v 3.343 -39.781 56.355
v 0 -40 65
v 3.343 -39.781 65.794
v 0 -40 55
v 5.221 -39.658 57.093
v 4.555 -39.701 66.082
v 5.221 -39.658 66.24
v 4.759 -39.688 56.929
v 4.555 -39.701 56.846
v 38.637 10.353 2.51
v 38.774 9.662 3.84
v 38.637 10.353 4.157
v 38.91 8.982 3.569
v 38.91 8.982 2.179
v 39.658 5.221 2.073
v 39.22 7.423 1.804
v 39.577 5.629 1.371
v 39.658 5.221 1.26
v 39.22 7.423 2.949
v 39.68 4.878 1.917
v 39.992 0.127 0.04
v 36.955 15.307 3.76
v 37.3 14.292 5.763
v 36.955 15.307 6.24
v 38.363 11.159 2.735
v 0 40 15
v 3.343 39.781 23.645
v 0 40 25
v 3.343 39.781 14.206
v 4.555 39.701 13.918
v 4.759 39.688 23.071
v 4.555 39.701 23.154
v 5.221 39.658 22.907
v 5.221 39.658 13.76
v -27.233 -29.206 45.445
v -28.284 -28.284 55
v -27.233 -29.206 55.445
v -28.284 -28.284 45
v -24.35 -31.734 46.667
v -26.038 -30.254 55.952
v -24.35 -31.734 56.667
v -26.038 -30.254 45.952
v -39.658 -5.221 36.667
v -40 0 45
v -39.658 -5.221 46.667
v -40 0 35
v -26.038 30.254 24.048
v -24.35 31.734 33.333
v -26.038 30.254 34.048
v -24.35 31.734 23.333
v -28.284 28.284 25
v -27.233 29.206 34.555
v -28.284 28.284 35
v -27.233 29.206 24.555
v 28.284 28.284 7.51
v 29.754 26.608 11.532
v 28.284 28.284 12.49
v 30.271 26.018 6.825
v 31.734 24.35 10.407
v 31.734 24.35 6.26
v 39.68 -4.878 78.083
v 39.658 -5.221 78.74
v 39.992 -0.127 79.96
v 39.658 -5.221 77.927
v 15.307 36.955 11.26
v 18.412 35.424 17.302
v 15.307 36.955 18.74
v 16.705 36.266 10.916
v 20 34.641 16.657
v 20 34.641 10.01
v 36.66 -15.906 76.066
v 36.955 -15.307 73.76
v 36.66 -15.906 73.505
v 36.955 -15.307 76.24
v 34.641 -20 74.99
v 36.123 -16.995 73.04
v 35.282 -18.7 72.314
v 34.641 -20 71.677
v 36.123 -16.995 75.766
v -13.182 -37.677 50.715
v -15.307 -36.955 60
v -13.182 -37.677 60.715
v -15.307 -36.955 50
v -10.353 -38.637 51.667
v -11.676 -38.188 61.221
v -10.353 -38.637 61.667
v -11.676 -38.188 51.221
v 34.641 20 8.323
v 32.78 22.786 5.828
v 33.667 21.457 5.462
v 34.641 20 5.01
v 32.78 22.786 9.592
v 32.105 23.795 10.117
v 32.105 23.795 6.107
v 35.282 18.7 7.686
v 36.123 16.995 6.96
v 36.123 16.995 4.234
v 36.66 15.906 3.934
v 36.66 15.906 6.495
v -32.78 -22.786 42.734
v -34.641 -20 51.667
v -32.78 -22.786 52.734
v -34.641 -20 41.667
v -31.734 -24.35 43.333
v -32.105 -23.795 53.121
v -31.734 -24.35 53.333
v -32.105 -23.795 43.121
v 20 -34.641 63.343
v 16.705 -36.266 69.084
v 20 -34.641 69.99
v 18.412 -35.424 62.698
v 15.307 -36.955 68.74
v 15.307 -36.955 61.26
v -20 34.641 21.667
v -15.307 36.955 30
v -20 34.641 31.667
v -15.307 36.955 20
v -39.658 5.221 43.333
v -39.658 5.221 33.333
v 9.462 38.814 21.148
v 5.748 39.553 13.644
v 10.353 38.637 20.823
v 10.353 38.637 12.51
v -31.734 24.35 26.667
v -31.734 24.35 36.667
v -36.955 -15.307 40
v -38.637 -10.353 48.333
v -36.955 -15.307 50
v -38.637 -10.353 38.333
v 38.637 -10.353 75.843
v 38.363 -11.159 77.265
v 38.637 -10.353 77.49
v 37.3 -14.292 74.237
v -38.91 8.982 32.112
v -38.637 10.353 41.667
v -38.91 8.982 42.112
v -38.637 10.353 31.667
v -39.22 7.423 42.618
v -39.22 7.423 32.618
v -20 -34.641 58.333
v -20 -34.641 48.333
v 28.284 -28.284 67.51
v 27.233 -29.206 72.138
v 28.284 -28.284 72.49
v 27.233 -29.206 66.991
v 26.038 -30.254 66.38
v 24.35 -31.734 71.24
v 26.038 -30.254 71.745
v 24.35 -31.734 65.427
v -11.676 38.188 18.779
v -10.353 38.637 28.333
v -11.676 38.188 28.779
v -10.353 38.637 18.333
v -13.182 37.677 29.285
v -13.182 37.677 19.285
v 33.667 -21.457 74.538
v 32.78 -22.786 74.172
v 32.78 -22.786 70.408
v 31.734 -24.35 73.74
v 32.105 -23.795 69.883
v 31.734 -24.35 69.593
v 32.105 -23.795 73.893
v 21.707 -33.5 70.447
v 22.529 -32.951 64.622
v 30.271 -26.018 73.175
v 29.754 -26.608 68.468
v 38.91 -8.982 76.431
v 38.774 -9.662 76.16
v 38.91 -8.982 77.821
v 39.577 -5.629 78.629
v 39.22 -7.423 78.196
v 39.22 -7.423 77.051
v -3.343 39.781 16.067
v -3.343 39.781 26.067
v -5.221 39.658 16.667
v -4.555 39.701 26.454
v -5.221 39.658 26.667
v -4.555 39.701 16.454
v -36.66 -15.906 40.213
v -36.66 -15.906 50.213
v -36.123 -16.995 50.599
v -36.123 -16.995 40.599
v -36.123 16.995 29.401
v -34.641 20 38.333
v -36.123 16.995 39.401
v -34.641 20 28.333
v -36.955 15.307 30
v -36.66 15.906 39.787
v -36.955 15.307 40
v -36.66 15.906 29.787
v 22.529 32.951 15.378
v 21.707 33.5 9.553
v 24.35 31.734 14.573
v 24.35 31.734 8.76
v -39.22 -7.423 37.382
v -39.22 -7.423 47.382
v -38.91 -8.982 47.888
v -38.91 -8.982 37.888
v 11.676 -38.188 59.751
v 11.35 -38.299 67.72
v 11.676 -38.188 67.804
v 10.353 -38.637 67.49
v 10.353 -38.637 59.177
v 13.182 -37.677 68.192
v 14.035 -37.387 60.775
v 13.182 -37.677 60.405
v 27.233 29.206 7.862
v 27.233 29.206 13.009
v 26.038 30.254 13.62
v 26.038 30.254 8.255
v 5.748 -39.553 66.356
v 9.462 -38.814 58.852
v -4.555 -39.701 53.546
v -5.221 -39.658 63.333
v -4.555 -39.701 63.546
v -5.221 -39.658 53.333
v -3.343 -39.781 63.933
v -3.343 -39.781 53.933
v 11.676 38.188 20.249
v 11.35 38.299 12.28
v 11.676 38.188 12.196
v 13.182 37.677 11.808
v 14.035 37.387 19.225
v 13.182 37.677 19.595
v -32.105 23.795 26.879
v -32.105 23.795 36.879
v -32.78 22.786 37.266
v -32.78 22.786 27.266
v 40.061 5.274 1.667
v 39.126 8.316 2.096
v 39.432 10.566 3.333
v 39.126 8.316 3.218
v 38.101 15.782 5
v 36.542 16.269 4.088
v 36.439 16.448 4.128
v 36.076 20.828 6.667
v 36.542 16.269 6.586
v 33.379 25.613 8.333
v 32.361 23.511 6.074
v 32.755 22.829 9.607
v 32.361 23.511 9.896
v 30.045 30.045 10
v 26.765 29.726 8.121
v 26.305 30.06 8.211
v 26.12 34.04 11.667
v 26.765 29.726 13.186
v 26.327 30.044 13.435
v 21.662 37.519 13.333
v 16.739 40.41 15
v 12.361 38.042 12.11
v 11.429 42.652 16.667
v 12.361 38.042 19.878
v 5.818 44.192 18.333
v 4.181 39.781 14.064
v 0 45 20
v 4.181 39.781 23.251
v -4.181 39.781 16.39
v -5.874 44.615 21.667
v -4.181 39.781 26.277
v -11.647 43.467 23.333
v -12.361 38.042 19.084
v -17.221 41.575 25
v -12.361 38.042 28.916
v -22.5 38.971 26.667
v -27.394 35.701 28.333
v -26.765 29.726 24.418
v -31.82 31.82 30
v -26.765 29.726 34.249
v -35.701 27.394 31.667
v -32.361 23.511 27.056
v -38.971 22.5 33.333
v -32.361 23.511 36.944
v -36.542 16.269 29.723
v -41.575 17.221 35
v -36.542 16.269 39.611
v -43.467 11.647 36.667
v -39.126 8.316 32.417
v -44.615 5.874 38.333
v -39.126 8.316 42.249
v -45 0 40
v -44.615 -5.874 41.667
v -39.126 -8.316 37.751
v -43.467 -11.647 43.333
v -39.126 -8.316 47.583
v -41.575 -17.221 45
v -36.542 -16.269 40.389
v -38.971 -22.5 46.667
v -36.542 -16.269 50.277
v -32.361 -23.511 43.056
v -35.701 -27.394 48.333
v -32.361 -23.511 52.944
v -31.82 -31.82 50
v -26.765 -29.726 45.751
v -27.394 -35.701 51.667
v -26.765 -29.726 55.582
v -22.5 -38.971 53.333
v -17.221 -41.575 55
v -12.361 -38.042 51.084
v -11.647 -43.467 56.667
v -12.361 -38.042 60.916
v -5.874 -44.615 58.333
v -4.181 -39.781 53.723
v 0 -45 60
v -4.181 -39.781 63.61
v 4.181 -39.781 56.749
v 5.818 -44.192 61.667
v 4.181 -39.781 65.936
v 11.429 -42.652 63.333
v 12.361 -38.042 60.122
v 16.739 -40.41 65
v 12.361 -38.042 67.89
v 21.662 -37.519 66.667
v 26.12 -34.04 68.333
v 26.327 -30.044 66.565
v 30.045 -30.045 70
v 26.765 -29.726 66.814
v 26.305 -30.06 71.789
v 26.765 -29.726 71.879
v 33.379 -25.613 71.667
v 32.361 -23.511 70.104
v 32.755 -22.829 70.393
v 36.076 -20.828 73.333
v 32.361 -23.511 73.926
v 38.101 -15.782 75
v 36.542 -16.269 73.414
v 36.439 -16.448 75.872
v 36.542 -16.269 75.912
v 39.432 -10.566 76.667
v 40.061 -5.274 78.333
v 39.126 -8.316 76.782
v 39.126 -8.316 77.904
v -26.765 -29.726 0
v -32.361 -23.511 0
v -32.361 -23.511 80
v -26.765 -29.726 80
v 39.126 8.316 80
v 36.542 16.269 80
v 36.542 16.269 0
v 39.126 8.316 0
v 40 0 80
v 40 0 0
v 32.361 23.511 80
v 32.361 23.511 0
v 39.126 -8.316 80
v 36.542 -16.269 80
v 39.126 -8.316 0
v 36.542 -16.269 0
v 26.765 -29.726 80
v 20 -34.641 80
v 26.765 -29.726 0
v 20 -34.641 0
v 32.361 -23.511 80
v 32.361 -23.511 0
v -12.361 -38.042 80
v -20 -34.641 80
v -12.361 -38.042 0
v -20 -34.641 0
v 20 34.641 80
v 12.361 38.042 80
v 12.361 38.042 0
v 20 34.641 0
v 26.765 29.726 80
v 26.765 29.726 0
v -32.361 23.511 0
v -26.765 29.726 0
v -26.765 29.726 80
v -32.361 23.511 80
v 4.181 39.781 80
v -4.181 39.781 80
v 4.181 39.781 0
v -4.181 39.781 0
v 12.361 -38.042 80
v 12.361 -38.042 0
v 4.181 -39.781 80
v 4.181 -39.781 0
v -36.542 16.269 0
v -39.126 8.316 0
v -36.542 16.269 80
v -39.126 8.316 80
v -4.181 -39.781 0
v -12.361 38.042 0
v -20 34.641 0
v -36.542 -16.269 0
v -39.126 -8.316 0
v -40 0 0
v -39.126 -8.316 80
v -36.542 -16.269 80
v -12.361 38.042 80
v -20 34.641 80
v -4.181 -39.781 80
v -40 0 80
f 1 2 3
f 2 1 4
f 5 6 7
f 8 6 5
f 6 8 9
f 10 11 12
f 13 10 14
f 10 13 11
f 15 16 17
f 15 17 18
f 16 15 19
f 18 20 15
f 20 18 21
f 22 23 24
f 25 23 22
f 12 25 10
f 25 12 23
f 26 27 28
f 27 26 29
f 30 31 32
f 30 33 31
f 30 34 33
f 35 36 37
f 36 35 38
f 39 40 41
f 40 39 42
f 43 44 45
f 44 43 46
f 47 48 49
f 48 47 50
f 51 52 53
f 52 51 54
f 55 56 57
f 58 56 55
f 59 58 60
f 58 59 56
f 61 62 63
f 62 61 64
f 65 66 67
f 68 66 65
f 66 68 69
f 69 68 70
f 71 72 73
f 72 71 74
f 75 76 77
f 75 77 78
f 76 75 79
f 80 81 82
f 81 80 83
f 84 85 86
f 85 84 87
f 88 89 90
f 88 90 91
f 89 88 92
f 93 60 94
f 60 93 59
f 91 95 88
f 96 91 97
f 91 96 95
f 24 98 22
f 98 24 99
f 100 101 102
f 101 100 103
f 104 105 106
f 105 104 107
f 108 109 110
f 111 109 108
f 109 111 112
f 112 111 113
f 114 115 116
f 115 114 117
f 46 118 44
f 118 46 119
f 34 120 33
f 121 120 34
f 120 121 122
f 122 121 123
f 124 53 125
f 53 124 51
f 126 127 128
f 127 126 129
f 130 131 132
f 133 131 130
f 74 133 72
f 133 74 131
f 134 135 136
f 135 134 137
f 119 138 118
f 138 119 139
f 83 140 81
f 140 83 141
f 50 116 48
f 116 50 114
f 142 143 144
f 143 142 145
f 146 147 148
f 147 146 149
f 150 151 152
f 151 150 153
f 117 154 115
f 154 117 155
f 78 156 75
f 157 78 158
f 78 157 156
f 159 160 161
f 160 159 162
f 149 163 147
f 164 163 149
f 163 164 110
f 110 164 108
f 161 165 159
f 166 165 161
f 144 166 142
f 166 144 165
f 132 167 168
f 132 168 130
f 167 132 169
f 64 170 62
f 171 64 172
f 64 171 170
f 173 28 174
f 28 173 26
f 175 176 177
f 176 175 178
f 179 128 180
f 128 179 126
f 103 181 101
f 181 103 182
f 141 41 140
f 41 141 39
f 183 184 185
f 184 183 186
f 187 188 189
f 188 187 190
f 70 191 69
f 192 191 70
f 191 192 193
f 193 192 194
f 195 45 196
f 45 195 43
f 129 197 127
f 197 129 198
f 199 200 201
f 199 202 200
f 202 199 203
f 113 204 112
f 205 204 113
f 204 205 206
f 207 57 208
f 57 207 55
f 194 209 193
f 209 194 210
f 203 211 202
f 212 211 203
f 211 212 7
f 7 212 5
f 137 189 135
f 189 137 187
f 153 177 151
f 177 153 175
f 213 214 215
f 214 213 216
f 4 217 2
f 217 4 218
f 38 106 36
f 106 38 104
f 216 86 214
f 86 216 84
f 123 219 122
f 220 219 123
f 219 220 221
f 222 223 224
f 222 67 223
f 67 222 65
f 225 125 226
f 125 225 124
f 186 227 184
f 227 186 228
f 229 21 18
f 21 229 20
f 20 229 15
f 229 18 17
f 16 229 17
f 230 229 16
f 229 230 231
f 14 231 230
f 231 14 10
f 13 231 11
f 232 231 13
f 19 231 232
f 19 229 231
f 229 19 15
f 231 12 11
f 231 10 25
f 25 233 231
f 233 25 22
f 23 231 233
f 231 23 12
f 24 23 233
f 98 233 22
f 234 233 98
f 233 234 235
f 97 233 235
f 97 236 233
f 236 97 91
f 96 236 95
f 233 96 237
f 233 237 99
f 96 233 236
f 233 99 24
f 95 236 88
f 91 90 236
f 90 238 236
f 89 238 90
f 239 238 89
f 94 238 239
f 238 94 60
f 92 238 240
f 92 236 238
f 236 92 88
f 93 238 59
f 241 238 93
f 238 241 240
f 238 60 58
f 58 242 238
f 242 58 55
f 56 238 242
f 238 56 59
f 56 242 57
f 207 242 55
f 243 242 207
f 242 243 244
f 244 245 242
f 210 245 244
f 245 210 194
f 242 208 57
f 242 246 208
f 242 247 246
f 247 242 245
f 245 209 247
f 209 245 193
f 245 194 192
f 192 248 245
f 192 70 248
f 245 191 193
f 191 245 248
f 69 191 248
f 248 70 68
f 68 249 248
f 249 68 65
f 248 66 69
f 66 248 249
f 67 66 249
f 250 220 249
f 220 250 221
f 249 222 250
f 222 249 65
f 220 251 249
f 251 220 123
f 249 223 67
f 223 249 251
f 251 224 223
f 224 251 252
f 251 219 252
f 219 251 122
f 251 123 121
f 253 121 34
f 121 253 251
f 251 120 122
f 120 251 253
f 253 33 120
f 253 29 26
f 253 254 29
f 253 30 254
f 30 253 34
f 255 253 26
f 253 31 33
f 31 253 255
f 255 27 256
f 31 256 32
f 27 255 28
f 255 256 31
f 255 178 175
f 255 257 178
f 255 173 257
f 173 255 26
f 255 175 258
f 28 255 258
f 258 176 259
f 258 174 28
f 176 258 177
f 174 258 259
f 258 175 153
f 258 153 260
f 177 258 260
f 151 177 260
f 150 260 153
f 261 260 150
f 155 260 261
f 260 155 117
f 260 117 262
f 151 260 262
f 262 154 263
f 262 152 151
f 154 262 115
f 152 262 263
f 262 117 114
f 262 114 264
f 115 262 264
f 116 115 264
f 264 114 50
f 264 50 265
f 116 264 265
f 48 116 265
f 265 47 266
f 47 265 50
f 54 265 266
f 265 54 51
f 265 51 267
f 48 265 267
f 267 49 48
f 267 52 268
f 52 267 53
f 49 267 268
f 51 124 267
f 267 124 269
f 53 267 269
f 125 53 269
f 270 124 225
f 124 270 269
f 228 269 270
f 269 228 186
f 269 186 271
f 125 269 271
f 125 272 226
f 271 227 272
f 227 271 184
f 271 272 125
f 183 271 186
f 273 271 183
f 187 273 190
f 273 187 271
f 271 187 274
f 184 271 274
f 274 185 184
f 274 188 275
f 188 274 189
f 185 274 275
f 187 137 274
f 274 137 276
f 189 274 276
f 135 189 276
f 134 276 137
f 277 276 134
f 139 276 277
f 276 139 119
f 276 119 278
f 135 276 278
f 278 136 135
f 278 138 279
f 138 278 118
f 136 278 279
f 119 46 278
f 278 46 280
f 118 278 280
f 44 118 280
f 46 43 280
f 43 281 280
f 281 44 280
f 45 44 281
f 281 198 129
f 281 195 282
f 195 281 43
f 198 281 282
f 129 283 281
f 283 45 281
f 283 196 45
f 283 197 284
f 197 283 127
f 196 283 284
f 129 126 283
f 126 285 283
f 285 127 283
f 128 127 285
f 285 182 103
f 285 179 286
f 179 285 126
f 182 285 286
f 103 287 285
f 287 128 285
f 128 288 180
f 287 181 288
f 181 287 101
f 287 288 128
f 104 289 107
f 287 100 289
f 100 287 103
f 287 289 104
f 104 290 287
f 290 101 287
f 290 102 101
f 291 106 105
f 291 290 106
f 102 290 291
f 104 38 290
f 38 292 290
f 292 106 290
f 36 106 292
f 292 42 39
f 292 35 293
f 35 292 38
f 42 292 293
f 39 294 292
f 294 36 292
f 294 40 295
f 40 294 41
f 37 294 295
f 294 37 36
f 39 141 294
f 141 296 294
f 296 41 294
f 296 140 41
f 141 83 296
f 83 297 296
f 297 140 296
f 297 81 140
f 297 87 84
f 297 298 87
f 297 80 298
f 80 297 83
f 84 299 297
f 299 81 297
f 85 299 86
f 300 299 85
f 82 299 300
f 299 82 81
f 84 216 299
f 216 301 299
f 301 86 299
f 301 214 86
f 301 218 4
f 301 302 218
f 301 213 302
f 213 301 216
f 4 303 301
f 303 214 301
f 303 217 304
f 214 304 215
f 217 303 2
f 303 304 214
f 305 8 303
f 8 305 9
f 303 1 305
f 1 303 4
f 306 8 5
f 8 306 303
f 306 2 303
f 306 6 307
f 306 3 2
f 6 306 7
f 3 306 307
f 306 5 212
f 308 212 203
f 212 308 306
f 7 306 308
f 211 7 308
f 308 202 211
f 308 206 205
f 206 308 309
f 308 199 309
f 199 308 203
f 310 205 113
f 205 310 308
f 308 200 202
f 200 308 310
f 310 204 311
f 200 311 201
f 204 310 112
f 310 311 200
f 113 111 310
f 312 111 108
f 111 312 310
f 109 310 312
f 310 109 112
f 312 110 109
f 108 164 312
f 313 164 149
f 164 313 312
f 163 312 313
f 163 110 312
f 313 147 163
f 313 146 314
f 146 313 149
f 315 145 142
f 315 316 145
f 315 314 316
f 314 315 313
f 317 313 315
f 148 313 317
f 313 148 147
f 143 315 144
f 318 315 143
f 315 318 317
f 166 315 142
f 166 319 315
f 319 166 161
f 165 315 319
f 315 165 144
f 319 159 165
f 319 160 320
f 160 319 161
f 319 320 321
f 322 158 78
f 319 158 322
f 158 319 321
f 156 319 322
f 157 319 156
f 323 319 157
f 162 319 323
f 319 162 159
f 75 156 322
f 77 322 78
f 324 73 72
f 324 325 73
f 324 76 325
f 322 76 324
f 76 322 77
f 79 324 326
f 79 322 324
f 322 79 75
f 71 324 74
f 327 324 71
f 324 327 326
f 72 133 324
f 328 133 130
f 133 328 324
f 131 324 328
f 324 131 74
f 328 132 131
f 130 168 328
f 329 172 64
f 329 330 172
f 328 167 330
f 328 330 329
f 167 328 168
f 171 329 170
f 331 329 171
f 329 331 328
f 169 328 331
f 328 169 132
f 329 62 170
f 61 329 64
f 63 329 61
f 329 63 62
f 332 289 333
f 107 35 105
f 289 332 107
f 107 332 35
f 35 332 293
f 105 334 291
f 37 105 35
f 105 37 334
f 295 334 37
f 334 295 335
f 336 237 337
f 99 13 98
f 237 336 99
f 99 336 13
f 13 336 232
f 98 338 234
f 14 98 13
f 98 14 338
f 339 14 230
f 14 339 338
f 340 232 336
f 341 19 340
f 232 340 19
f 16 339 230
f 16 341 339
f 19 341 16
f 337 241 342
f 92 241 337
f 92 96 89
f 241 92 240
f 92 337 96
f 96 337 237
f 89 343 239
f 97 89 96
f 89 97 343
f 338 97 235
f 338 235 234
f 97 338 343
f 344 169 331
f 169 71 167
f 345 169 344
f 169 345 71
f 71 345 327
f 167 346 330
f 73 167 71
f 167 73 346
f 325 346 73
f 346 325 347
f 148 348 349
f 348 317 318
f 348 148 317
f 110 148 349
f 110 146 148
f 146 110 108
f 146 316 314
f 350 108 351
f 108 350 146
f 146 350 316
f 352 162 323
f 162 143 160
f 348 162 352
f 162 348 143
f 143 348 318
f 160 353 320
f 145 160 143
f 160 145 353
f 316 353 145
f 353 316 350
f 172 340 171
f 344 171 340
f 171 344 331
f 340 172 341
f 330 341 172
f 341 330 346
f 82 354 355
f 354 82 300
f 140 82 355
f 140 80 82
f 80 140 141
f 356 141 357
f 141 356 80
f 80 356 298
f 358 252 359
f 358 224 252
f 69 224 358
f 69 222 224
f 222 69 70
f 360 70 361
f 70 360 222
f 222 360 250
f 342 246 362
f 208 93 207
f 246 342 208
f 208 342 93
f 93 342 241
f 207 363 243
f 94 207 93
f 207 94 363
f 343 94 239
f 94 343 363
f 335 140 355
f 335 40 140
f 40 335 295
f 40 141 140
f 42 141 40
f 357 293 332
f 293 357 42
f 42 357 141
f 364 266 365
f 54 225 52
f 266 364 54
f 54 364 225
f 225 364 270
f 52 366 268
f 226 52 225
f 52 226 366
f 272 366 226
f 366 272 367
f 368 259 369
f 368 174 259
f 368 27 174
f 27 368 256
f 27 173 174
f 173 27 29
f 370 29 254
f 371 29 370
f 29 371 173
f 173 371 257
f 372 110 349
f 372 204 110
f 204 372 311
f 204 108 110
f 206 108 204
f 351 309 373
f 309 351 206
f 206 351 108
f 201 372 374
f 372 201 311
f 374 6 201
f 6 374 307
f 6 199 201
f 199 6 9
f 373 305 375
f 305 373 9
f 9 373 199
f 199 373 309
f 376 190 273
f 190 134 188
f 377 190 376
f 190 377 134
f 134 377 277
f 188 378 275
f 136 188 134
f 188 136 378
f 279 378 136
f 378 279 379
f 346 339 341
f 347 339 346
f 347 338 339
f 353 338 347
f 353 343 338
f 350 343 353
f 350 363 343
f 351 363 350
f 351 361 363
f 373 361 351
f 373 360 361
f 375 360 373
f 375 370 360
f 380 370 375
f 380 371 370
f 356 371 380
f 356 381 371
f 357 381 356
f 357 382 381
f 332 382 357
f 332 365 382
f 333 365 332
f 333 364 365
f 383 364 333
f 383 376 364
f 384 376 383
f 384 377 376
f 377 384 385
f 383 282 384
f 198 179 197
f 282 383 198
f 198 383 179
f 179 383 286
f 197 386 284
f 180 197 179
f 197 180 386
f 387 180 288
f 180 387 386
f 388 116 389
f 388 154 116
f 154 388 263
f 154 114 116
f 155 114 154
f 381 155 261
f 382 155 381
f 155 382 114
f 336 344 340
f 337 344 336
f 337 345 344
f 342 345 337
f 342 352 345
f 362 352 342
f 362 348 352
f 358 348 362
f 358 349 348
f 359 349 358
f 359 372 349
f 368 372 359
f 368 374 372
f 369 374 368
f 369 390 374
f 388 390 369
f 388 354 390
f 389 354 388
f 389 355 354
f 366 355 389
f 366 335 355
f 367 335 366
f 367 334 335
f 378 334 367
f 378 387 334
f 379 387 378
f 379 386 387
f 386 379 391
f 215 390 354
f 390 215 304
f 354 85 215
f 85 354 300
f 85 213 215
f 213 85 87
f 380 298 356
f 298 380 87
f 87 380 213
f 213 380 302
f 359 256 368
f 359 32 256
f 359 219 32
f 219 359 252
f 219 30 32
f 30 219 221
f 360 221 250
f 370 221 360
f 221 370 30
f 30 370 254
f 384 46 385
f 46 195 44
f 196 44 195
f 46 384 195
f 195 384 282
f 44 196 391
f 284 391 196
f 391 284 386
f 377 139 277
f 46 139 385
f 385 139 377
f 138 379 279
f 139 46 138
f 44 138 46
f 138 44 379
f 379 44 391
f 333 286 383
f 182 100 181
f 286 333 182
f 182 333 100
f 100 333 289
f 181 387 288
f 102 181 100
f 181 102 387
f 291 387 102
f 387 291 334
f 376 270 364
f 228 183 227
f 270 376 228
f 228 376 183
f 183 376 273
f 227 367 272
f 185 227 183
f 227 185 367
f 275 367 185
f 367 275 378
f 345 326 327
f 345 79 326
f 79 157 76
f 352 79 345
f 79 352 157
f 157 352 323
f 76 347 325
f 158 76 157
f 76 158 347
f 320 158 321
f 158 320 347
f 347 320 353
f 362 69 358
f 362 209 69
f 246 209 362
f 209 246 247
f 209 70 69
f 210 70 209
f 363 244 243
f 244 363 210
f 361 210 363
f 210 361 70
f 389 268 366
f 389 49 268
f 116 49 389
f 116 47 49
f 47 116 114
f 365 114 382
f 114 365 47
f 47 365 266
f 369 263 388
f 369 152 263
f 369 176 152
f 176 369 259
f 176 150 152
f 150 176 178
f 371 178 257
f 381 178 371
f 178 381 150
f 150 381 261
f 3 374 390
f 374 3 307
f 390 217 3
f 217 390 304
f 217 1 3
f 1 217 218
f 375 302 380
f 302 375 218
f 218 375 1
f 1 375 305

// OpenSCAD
// Generated by SolidPython 0.4.5 on 2019-12-22 19:00:28


union() {
	render() {
		intersection() {
			polyhedron(faces = [[0, 1, 3], [1, 4, 3], [1, 2, 4], [2, 5, 4], [0, 5, 2], [0, 3, 5], [3, 4, 6], [4, 7, 6], [4, 5, 7], [5, 8, 7], [3, 8, 5], [3, 6, 8], [6, 7, 9], [7, 10, 9], [7, 8, 10], [8, 11, 10], [6, 11, 8], [6, 9, 11], [9, 10, 12], [10, 13, 12], [10, 11, 13], [11, 14, 13], [9, 14, 11], [9, 12, 14], [12, 13, 15], [13, 16, 15], [13, 14, 16], [14, 17, 16], [12, 17, 14], [12, 15, 17], [15, 16, 18], [16, 19, 18], [16, 17, 19], [17, 20, 19], [15, 20, 17], [15, 18, 20], [18, 19, 21], [19, 22, 21], [19, 20, 22], [20, 23, 22], [18, 23, 20], [18, 21, 23], [21, 22, 24], [22, 25, 24], [22, 23, 25], [23, 26, 25], [21, 26, 23], [21, 24, 26], [24, 25, 27], [25, 28, 27], [25, 26, 28], [26, 29, 28], [24, 29, 26], [24, 27, 29], [27, 28, 30], [28, 31, 30], [28, 29, 31], [29, 32, 31], [27, 32, 29], [27, 30, 32], [30, 31, 33], [31, 34, 33], [31, 32, 34], [32, 35, 34], [30, 35, 32], [30, 33, 35], [33, 34, 36], [34, 37, 36], [34, 35, 37], [35, 38, 37], [33, 38, 35], [33, 36, 38], [36, 37, 39], [37, 40, 39], [37, 38, 40], [38, 41, 40], [36, 41, 38], [36, 39, 41], [39, 40, 42], [40, 43, 42], [40, 41, 43], [41, 44, 43], [39, 44, 41], [39, 42, 44], [42, 43, 45], [43, 46, 45], [43, 44, 46], [44, 47, 46], [42, 47, 44], [42, 45, 47], [45, 46, 48], [46, 49, 48], [46, 47, 49], [47, 50, 49], [45, 50, 47], [45, 48, 50], [48, 49, 51], [49, 52, 51], [49, 50, 52], [50, 53, 52], [48, 53, 50], [48, 51, 53], [51, 52, 54], [52, 55, 54], [52, 53, 55], [53, 56, 55], [51, 56, 53], [51, 54, 56], [54, 55, 57], [55, 58, 57], [55, 56, 58], [56, 59, 58], [54, 59, 56], [54, 57, 59], [57, 58, 60], [58, 61, 60], [58, 59, 61], [59, 62, 61], [57, 62, 59], [57, 60, 62], [60, 61, 63], [61, 64, 63], [61, 62, 64], [62, 65, 64], [60, 65, 62], [60, 63, 65], [63, 64, 66], [64, 67, 66], [64, 65, 67], [65, 68, 67], [63, 68, 65], [63, 66, 68], [66, 67, 69], [67, 70, 69], [67, 68, 70], [68, 71, 70], [66, 71, 68], [66, 69, 71], [69, 70, 72], [70, 73, 72], [70, 71, 73], [71, 74, 73], [69, 74, 71], [69, 72, 74], [72, 73, 75], [73, 76, 75], [73, 74, 76], [74, 77, 76], [72, 77, 74], [72, 75, 77], [75, 76, 78], [76, 79, 78], [76, 77, 79], [77, 80, 79], [75, 80, 77], [75, 78, 80], [78, 79, 81], [79, 82, 81], [79, 80, 82], [80, 83, 82], [78, 83, 80], [78, 81, 83], [81, 82, 84], [82, 85, 84], [82, 83, 85], [83, 86, 85], [81, 86, 83], [81, 84, 86], [84, 85, 87], [85, 88, 87], [85, 86, 88], [86, 89, 88], [84, 89, 86], [84, 87, 89], [87, 88, 90], [88, 91, 90], [88, 89, 91], [89, 92, 91], [87, 92, 89], [87, 90, 92], [90, 91, 93], [91, 94, 93], [91, 92, 94], [92, 95, 94], [90, 95, 92], [90, 93, 95], [93, 94, 96], [94, 97, 96], [94, 95, 97], [95, 98, 97], [93, 98, 95], [93, 96, 98], [96, 97, 99], [97, 100, 99], [97, 98, 100], [98, 101, 100], [96, 101, 98], [96, 99, 101], [99, 100, 102], [100, 103, 102], [100, 101, 103], [101, 104, 103], [99, 104, 101], [99, 102, 104], [102, 103, 105], [103, 106, 105], [103, 104, 106], [104, 107, 106], [102, 107, 104], [102, 105, 107], [105, 106, 108], [106, 109, 108], [106, 107, 109], [107, 110, 109], [105, 110, 107], [105, 108, 110], [108, 109, 111], [109, 112, 111], [109, 110, 112], [110, 113, 112], [108, 113, 110], [108, 111, 113], [111, 112, 114], [112, 115, 114], [112, 113, 115], [113, 116, 115], [111, 116, 113], [111, 114, 116], [114, 115, 117], [115, 118, 117], [115, 116, 118], [116, 119, 118], [114, 119, 116], [114, 117, 119], [117, 118, 120], [118, 121, 120], [118, 119, 121], [119, 122, 121], [117, 122, 119], [117, 120, 122], [120, 121, 123], [121, 124, 123], [121, 122, 124], [122, 125, 124], [120, 125, 122], [120, 123, 125], [123, 124, 126], [124, 127, 126], [124, 125, 127], [125, 128, 127], [123, 128, 125], [123, 126, 128], [126, 127, 129], [127, 130, 129], [127, 128, 130], [128, 131, 130], [126, 131, 128], [126, 129, 131], [129, 130, 132], [130, 133, 132], [130, 131, 133], [131, 134, 133], [129, 134, 131], [129, 132, 134], [132, 133, 135], [133, 136, 135], [133, 134, 136], [134, 137, 136], [132, 137, 134], [132, 135, 137], [135, 136, 138], [136, 139, 138], [136, 137, 139], [137, 140, 139], [135, 140, 137], [135, 138, 140], [138, 139, 141], [139, 142, 141], [139, 140, 142], [140, 143, 142], [138, 143, 140], [138, 141, 143], [141, 142, 144], [142, 145, 144], [142, 143, 145], [143, 146, 145], [141, 146, 143], [141, 144, 146], [0, 2, 1], [144, 145, 146]], points = [[34.9900000000, 0.0000000000, -5.0000000000], [39.9900000000, 0.0000000000, 0.0000000000], [34.9900000000, 0.0000000000, 5.0000000000], [35.1037577250, 4.6214973792, -3.3333333333], [40.0609820319, 5.2741283403, 1.6666666667], [35.1037577250, 4.6214973792, 6.6666666667], [34.6026828504, 9.2717609257, -1.6666666667], [39.4323119819, 10.5658561512, 3.3333333333], [34.6026828504, 9.2717609257, 8.3333333333], [33.4813942582, 13.8684475889, 0.0000000000], [38.1007919208, 15.7818647507, 5.0000000000], [33.4813942582, 13.8684475889, 10.0000000000], [31.7456045514, 18.3283333333, 1.6666666667], [36.0757315703, 20.8283333333, 6.6666666667], [31.7456045514, 18.3283333333, 11.6666666667], [29.4122528357, 22.5688153781, 3.3333333333], [33.3790195372, 25.6126225232, 8.3333333333], [29.4122528357, 22.5688153781, 13.3333333333], [26.5094332267, 26.5094332267, 5.0000000000], [30.0449671326, 30.0449671326, 10.0000000000], [26.5094332267, 26.5094332267, 15.0000000000], [23.0761165690, 30.0733806193, 6.6666666667], [26.1199237140, 34.0401473208, 11.6666666667], [23.0761165690, 30.0733806193, 16.6666666667], [19.1616666667, 33.1889802244, 8.3333333333], [21.6616666667, 37.5191072433, 13.3333333333], [19.1616666667, 33.1889802244, 18.3333333333], [14.8251561698, 35.7910930895, 10.0000000000], [16.7385733316, 40.4104907520, 15.0000000000], [14.8251561698, 35.7910930895, 20.0000000000], [10.1344910761, 37.8224356047, 11.6666666667], [11.4285863016, 42.6520647362, 16.6666666667], [10.1344910761, 37.8224356047, 21.6666666667], [5.1653565135, 39.2347779808, 13.3333333333], [5.8179874746, 44.1920022876, 18.3333333333], [5.1653565135, 39.2347779808, 23.3333333333], [0.0000000000, 40.0000000000, 15.0000000000], [0.0000000000, 45.0000000000, 20.0000000000], [0.0000000000, 40.0000000000, 25.0000000000], [-5.2210476888, 39.6577944550, 16.6666666667], [-5.8736786499, 44.6150187618, 21.6666666667], [-5.2210476888, 39.6577944550, 26.6666666667], [-10.3527618041, 38.6370330516, 18.3333333333], [-11.6468570296, 43.4666621830, 23.3333333333], [-10.3527618041, 38.6370330516, 28.3333333333], [-15.3073372946, 36.9551813005, 20.0000000000], [-17.2207544564, 41.5745789630, 25.0000000000], [-15.3073372946, 36.9551813005, 30.0000000000], [-20.0000000000, 34.6410161514, 21.6666666667], [-22.5000000000, 38.9711431703, 26.6666666667], [-20.0000000000, 34.6410161514, 31.6666666667], [-24.3504571603, 31.7341336116, 23.3333333333], [-27.3942643054, 35.7009003131, 28.3333333333], [-24.3504571603, 31.7341336116, 33.3333333333], [-28.2842712475, 28.2842712475, 25.0000000000], [-31.8198051534, 31.8198051534, 30.0000000000], [-28.2842712475, 28.2842712475, 35.0000000000], [-31.7341336116, 24.3504571603, 26.6666666667], [-35.7009003131, 27.3942643054, 31.6666666667], [-31.7341336116, 24.3504571603, 36.6666666667], [-34.6410161514, 20.0000000000, 28.3333333333], [-38.9711431703, 22.5000000000, 33.3333333333], [-34.6410161514, 20.0000000000, 38.3333333333], [-36.9551813005, 15.3073372946, 30.0000000000], [-41.5745789630, 17.2207544564, 35.0000000000], [-36.9551813005, 15.3073372946, 40.0000000000], [-38.6370330516, 10.3527618041, 31.6666666667], [-43.4666621830, 11.6468570296, 36.6666666667], [-38.6370330516, 10.3527618041, 41.6666666667], [-39.6577944550, 5.2210476888, 33.3333333333], [-44.6150187618, 5.8736786499, 38.3333333333], [-39.6577944550, 5.2210476888, 43.3333333333], [-40.0000000000, 0.0000000000, 35.0000000000], [-45.0000000000, 0.0000000000, 40.0000000000], [-40.0000000000, 0.0000000000, 45.0000000000], [-39.6577944550, -5.2210476888, 36.6666666667], [-44.6150187618, -5.8736786499, 41.6666666667], [-39.6577944550, -5.2210476888, 46.6666666667], [-38.6370330516, -10.3527618041, 38.3333333333], [-43.4666621830, -11.6468570296, 43.3333333333], [-38.6370330516, -10.3527618041, 48.3333333333], [-36.9551813005, -15.3073372946, 40.0000000000], [-41.5745789630, -17.2207544564, 45.0000000000], [-36.9551813005, -15.3073372946, 50.0000000000], [-34.6410161514, -20.0000000000, 41.6666666667], [-38.9711431703, -22.5000000000, 46.6666666667], [-34.6410161514, -20.0000000000, 51.6666666667], [-31.7341336116, -24.3504571603, 43.3333333333], [-35.7009003131, -27.3942643054, 48.3333333333], [-31.7341336116, -24.3504571603, 53.3333333333], [-28.2842712475, -28.2842712475, 45.0000000000], [-31.8198051534, -31.8198051534, 50.0000000000], [-28.2842712475, -28.2842712475, 55.0000000000], [-24.3504571603, -31.7341336116, 46.6666666667], [-27.3942643054, -35.7009003131, 51.6666666667], [-24.3504571603, -31.7341336116, 56.6666666667], [-20.0000000000, -34.6410161514, 48.3333333333], [-22.5000000000, -38.9711431703, 53.3333333333], [-20.0000000000, -34.6410161514, 58.3333333333], [-15.3073372946, -36.9551813005, 50.0000000000], [-17.2207544564, -41.5745789630, 55.0000000000], [-15.3073372946, -36.9551813005, 60.0000000000], [-10.3527618041, -38.6370330516, 51.6666666667], [-11.6468570296, -43.4666621830, 56.6666666667], [-10.3527618041, -38.6370330516, 61.6666666667], [-5.2210476888, -39.6577944550, 53.3333333333], [-5.8736786499, -44.6150187618, 58.3333333333], [-5.2210476888, -39.6577944550, 63.3333333333], [-0.0000000000, -40.0000000000, 55.0000000000], [-0.0000000000, -45.0000000000, 60.0000000000], [-0.0000000000, -40.0000000000, 65.0000000000], [5.1653565135, -39.2347779808, 56.6666666667], [5.8179874746, -44.1920022876, 61.6666666667], [5.1653565135, -39.2347779808, 66.6666666667], [10.1344910761, -37.8224356047, 58.3333333333], [11.4285863016, -42.6520647362, 63.3333333333], [10.1344910761, -37.8224356047, 68.3333333333], [14.8251561698, -35.7910930895, 60.0000000000], [16.7385733316, -40.4104907520, 65.0000000000], [14.8251561698, -35.7910930895, 70.0000000000], [19.1616666667, -33.1889802244, 61.6666666667], [21.6616666667, -37.5191072433, 66.6666666667], [19.1616666667, -33.1889802244, 71.6666666667], [23.0761165690, -30.0733806193, 63.3333333333], [26.1199237140, -34.0401473208, 68.3333333333], [23.0761165690, -30.0733806193, 73.3333333333], [26.5094332267, -26.5094332267, 65.0000000000], [30.0449671326, -30.0449671326, 70.0000000000], [26.5094332267, -26.5094332267, 75.0000000000], [29.4122528357, -22.5688153781, 66.6666666667], [33.3790195372, -25.6126225232, 71.6666666667], [29.4122528357, -22.5688153781, 76.6666666667], [31.7456045514, -18.3283333333, 68.3333333333], [36.0757315703, -20.8283333333, 73.3333333333], [31.7456045514, -18.3283333333, 78.3333333333], [33.4813942582, -13.8684475889, 70.0000000000], [38.1007919208, -15.7818647507, 75.0000000000], [33.4813942582, -13.8684475889, 80.0000000000], [34.6026828504, -9.2717609257, 71.6666666667], [39.4323119819, -10.5658561512, 76.6666666667], [34.6026828504, -9.2717609257, 81.6666666667], [35.1037577250, -4.6214973792, 73.3333333333], [40.0609820319, -5.2741283403, 78.3333333333], [35.1037577250, -4.6214973792, 83.3333333333], [34.9900000000, -0.0000000000, 75.0000000000], [39.9900000000, -0.0000000000, 80.0000000000], [34.9900000000, -0.0000000000, 85.0000000000]]);
			difference() {
				cylinder($fn = 48, h = 80, r = 45.0100000000);
				cylinder($fn = 48, h = 80, r = 40);
			}
		}
	}
	cylinder(h = 80, r = 40);
}
/***********************************************
*********      SolidPython code:      **********
************************************************
 
#! /usr/bin/env python3
import sys

from solid import scad_render_to_file
from solid import screw_thread
from solid.objects import cylinder

SEGMENTS = 48

inner_rad = 40
screw_height = 80


def assembly():
    section = screw_thread.default_thread_section(tooth_height=10, tooth_depth=5)
    s = screw_thread.thread(outline_pts=section,
                            inner_rad=inner_rad,
                            pitch=screw_height,
                            length=screw_height,
                            segments_per_rot=SEGMENTS,
                            neck_in_degrees=90,
                            neck_out_degrees=90)

    c = cylinder(r=inner_rad, h=screw_height)
    return s + c


if __name__ == '__main__':
    out_dir = sys.argv[1] if len(sys.argv) > 1 else None
    a = assembly()
    file_out = scad_render_to_file(a, out_dir=out_dir, include_orig_code=True)
    print(f"{__file__}: SCAD file written to: \n{file_out}")
 
 
************************************************/
